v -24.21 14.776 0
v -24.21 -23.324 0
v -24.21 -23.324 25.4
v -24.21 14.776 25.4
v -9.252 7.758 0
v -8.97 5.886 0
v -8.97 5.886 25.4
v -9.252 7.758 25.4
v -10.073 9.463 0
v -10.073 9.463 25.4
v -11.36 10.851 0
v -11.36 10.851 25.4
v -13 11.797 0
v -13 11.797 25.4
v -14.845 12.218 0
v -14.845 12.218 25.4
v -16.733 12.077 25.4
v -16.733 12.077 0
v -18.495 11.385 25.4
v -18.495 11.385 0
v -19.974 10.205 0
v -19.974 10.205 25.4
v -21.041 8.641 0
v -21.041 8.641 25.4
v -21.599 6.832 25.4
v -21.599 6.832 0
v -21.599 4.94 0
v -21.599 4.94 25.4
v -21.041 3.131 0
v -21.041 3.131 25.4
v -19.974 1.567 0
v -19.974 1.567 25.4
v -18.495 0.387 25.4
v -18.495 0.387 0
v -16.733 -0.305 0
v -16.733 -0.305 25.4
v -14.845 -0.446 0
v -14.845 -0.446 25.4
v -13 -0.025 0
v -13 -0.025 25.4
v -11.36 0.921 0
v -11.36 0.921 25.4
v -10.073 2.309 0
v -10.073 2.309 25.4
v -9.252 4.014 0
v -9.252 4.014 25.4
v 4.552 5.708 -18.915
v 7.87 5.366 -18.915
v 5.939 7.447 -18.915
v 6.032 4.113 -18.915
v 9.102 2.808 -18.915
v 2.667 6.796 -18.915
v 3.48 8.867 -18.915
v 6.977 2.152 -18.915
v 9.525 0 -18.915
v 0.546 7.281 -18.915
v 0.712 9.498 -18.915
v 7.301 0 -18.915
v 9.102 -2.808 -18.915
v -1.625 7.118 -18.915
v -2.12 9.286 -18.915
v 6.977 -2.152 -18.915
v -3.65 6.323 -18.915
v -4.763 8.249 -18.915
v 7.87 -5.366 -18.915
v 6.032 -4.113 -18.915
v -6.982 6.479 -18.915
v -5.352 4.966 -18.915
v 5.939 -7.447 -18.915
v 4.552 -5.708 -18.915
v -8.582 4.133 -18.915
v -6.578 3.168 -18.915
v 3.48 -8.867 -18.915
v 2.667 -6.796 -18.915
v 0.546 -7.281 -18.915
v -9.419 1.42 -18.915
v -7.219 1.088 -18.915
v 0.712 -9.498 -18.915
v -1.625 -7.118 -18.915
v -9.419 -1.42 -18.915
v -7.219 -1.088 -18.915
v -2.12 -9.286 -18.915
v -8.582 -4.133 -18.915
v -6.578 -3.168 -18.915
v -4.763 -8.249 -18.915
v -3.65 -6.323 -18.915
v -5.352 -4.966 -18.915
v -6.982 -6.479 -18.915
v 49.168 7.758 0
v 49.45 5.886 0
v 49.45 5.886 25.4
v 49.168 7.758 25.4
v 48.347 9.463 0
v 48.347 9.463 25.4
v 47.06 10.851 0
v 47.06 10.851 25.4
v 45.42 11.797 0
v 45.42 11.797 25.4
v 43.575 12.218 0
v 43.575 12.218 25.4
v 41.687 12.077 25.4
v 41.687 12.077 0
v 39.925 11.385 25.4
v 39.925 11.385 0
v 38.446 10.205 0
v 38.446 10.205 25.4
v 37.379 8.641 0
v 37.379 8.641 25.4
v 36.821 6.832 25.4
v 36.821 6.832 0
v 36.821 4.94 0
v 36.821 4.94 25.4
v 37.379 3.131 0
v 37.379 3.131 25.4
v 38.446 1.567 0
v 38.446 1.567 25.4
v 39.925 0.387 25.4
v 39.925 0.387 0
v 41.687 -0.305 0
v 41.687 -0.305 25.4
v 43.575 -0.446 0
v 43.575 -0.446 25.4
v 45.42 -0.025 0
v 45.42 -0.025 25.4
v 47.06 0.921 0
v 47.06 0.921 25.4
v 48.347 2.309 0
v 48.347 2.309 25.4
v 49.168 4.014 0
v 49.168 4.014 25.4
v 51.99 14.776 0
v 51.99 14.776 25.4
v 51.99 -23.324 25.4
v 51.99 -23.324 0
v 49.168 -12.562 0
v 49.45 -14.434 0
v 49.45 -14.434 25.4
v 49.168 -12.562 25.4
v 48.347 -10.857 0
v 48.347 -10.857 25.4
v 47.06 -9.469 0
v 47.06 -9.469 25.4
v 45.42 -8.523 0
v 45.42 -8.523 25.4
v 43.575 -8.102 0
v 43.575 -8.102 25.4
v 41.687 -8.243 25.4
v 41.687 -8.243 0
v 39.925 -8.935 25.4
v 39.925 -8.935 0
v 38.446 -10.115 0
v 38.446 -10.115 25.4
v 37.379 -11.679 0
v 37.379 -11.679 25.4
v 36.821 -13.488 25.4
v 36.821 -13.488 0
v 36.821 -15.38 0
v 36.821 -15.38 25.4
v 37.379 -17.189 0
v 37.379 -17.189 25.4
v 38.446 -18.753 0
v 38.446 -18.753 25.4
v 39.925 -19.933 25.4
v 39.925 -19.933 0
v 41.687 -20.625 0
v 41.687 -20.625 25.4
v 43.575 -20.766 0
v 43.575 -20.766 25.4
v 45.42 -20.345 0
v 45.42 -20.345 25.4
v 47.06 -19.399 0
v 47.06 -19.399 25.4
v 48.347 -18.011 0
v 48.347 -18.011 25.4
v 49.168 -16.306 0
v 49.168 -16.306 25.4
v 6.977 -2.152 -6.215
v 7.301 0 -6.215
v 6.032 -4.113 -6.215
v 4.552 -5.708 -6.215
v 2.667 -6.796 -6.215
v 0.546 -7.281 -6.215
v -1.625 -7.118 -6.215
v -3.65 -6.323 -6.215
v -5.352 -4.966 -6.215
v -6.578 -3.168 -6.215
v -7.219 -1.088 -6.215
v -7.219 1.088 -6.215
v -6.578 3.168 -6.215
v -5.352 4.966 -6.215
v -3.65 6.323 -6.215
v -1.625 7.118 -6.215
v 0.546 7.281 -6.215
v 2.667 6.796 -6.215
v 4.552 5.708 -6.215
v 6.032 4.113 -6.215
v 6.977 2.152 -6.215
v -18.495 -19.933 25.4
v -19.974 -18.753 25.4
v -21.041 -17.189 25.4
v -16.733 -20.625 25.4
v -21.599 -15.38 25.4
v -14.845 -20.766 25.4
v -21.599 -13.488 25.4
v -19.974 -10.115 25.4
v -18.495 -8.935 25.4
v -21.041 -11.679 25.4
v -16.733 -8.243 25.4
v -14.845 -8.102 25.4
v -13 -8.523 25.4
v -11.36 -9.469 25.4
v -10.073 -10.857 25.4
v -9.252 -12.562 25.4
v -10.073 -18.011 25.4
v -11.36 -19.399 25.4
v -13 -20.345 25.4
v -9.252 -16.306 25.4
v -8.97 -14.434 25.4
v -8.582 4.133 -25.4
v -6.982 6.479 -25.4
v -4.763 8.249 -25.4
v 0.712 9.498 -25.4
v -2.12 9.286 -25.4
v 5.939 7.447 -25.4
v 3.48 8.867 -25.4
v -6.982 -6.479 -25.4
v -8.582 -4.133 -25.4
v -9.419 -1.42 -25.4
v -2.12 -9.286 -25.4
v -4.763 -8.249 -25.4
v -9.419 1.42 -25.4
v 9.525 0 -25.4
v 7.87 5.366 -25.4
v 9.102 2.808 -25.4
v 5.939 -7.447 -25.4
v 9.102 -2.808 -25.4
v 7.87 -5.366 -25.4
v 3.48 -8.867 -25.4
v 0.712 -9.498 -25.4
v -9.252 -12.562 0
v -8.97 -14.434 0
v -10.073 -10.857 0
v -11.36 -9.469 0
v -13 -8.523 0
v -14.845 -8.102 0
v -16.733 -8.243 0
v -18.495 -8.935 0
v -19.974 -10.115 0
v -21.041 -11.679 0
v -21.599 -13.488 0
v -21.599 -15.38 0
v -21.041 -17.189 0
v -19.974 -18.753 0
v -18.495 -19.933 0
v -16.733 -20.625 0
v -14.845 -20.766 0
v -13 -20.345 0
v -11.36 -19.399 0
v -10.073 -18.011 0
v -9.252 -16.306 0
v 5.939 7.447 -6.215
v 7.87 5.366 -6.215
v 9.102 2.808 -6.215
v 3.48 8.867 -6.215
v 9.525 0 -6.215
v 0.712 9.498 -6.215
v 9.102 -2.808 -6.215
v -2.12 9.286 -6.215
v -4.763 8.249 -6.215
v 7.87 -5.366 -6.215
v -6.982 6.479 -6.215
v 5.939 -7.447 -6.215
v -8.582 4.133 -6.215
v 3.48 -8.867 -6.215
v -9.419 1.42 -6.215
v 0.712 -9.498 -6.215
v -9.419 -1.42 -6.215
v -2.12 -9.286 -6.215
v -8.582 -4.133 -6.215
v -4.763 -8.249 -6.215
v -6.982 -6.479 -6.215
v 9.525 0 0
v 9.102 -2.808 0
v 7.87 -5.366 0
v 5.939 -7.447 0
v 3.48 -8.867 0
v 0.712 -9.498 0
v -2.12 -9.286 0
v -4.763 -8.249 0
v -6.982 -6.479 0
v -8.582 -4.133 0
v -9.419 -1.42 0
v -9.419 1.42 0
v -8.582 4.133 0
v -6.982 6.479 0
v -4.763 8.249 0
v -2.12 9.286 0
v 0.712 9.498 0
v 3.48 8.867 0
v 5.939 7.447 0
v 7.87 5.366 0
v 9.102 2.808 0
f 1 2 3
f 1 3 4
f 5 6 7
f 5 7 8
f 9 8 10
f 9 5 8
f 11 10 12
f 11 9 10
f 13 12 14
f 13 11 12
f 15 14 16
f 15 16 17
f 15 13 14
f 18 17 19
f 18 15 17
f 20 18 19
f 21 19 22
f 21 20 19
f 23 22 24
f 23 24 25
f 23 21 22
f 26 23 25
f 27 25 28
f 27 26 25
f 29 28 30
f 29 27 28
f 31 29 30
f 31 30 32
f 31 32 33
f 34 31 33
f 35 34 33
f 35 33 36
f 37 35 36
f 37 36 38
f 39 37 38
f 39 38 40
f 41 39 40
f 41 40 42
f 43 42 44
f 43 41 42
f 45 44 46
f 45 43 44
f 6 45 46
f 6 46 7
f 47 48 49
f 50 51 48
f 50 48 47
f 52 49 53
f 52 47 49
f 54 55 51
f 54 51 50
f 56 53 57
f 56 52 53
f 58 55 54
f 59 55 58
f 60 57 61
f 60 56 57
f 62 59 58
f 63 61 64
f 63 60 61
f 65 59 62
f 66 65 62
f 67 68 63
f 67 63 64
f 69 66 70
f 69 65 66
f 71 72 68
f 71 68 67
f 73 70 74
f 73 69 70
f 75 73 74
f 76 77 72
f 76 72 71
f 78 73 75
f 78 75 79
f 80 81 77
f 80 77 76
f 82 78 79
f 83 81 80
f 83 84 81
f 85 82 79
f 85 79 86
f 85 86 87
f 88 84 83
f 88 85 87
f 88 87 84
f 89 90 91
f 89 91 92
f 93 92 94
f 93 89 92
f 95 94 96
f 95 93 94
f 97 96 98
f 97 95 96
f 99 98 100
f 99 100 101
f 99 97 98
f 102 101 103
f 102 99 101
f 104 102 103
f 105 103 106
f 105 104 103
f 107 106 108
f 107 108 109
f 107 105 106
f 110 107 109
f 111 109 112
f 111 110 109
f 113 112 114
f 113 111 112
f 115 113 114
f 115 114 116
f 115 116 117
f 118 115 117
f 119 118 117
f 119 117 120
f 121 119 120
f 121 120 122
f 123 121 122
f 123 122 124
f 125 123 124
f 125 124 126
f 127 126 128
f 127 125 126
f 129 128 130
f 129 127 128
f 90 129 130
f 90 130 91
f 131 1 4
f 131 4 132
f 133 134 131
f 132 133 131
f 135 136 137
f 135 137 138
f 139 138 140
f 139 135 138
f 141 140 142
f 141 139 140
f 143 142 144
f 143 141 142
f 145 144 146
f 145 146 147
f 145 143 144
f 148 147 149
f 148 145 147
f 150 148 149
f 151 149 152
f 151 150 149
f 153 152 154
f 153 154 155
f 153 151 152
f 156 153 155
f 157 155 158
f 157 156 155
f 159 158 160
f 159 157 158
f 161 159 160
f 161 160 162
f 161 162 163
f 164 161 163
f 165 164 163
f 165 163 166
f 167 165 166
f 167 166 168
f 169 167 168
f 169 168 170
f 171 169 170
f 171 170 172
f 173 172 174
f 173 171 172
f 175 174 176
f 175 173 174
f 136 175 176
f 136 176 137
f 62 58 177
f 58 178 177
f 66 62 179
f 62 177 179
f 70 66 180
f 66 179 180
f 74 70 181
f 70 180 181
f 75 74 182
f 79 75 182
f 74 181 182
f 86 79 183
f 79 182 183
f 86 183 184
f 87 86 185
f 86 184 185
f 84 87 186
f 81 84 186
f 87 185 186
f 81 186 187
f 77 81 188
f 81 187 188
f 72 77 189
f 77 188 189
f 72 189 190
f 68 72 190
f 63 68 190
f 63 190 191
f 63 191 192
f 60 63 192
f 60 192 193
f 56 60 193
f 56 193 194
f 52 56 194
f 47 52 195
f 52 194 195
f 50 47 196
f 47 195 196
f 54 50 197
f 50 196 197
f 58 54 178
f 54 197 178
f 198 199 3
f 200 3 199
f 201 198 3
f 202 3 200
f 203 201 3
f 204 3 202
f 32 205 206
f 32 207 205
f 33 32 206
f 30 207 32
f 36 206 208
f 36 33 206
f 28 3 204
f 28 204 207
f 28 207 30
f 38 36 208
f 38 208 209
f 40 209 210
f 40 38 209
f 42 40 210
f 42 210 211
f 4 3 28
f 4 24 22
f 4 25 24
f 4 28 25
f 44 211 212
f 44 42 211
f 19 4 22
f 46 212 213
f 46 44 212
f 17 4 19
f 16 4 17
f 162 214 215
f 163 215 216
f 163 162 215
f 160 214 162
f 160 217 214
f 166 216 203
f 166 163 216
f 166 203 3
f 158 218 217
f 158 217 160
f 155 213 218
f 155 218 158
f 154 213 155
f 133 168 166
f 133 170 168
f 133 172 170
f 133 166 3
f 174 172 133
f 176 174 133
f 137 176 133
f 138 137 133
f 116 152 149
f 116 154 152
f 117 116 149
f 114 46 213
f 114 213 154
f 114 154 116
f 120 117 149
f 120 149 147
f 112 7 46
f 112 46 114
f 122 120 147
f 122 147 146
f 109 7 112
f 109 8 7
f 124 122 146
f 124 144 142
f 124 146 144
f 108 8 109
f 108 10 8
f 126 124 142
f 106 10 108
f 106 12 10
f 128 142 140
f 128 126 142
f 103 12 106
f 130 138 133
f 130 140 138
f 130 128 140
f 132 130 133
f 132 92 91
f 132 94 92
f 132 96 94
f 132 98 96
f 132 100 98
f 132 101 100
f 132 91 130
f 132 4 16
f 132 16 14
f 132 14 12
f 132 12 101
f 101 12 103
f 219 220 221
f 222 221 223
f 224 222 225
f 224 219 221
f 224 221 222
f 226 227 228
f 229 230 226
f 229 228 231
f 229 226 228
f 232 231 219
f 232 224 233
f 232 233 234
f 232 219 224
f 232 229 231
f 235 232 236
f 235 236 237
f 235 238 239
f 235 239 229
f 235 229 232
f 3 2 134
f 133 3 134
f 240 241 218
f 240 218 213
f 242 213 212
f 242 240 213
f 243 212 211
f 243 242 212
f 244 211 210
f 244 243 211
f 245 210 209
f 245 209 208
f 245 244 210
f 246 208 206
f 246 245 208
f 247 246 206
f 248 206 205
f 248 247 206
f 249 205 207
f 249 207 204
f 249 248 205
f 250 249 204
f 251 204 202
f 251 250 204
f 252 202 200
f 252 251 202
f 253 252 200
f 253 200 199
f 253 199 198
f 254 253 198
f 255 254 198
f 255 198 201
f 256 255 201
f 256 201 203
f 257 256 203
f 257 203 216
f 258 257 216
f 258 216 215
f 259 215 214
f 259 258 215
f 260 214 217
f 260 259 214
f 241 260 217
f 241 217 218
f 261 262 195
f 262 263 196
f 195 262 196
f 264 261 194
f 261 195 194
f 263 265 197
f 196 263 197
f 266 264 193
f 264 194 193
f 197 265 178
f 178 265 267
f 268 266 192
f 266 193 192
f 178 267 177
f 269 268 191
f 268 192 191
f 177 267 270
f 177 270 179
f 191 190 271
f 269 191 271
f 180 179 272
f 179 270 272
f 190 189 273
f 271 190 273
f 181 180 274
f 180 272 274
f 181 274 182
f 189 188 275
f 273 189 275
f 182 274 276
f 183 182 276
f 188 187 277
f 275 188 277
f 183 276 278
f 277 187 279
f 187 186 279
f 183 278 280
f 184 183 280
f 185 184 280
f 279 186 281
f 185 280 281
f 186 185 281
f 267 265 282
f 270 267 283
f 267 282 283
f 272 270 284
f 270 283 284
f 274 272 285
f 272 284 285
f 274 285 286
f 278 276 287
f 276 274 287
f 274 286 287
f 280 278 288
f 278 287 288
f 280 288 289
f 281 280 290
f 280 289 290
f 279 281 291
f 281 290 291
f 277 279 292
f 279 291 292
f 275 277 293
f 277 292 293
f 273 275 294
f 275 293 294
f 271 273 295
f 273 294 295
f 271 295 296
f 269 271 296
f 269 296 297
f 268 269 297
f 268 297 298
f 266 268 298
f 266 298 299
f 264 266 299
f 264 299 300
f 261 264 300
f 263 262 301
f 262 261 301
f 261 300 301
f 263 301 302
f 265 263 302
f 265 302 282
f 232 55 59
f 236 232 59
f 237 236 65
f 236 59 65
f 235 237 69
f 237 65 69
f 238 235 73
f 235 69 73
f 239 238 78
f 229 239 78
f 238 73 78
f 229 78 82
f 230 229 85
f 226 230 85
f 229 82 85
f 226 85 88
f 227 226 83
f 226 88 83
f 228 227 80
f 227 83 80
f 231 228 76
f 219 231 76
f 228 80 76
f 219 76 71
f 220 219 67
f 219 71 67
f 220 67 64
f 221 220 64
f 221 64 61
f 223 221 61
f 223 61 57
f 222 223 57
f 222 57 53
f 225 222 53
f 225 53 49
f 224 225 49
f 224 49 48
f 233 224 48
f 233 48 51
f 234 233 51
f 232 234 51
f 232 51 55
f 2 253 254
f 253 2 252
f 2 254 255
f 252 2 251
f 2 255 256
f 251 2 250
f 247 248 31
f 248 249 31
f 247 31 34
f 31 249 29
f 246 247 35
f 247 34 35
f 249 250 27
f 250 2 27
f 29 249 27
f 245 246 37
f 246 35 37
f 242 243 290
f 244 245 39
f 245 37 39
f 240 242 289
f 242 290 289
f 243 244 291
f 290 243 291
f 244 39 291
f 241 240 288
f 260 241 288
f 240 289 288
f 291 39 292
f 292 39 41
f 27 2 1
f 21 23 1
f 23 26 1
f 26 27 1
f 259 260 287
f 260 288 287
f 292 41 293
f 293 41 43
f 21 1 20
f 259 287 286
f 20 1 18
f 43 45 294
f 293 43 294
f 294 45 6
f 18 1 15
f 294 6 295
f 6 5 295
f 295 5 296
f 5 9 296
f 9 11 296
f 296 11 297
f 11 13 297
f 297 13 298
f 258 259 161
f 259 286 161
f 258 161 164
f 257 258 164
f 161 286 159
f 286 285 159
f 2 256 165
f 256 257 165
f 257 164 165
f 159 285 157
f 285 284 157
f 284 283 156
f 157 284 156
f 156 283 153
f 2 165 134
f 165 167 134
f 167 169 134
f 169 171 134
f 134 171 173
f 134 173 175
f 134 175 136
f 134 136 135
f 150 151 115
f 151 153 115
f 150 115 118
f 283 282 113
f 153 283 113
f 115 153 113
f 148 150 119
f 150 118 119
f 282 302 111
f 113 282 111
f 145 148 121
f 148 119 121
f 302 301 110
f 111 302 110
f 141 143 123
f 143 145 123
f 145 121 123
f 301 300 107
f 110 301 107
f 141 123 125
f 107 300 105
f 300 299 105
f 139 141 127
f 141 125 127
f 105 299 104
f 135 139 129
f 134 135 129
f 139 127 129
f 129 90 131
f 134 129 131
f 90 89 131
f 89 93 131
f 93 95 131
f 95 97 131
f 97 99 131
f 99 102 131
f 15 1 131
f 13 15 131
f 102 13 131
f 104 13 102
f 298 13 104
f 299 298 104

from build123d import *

# Parameters (mm, degrees)
F0_W     = 76.2
F0_H     = 38.1
F1_DEPTH = 25.4
F2_R     = 6.35
F3_DEPTH = 25.4
F4_R     = 9.525
F5_DEPTH = 25.4
F6_W     = 12.7
F6_H     = 12.7


with BuildPart() as f1:
    # F0 (on Top) → F1 (new body)
    with BuildSketch(Plane.XY):
        with Locations((13.890495, -4.273948)):
            Rectangle(F0_W, F0_H)
    extrude(amount=F1_DEPTH)

    # F2 (on Top) → F3 (cut)
    with BuildSketch(Plane.XY):
        with Locations((-15.319505, 5.886052)):
            Circle(F2_R)
        with Locations((-15.319505, -14.433948)):
            Circle(F2_R)
        with Locations((43.100495, 5.886052)):
            Circle(F2_R)
        with Locations((43.100495, -14.433948)):
            Circle(F2_R)
    extrude(amount=F3_DEPTH, mode=Mode.SUBTRACT)

    # F4 (on face) → F5 (join)
    with BuildSketch(Plane(origin=(0, 0, 0), x_dir=(1, 0, 0), z_dir=(0, 0, -1))):
        Circle(F4_R)
    extrude(amount=F5_DEPTH)

    # F6 (on Front) → F7 (revolve, cut)
    with BuildSketch(Plane.XZ):
        with Locations((13.650996, -12.565433)):
            Rectangle(F6_W, F6_H)
    revolve(axis=Axis((0, 0, -25.4), (0, 0, -1)), mode=Mode.SUBTRACT)


solid = f1.part
